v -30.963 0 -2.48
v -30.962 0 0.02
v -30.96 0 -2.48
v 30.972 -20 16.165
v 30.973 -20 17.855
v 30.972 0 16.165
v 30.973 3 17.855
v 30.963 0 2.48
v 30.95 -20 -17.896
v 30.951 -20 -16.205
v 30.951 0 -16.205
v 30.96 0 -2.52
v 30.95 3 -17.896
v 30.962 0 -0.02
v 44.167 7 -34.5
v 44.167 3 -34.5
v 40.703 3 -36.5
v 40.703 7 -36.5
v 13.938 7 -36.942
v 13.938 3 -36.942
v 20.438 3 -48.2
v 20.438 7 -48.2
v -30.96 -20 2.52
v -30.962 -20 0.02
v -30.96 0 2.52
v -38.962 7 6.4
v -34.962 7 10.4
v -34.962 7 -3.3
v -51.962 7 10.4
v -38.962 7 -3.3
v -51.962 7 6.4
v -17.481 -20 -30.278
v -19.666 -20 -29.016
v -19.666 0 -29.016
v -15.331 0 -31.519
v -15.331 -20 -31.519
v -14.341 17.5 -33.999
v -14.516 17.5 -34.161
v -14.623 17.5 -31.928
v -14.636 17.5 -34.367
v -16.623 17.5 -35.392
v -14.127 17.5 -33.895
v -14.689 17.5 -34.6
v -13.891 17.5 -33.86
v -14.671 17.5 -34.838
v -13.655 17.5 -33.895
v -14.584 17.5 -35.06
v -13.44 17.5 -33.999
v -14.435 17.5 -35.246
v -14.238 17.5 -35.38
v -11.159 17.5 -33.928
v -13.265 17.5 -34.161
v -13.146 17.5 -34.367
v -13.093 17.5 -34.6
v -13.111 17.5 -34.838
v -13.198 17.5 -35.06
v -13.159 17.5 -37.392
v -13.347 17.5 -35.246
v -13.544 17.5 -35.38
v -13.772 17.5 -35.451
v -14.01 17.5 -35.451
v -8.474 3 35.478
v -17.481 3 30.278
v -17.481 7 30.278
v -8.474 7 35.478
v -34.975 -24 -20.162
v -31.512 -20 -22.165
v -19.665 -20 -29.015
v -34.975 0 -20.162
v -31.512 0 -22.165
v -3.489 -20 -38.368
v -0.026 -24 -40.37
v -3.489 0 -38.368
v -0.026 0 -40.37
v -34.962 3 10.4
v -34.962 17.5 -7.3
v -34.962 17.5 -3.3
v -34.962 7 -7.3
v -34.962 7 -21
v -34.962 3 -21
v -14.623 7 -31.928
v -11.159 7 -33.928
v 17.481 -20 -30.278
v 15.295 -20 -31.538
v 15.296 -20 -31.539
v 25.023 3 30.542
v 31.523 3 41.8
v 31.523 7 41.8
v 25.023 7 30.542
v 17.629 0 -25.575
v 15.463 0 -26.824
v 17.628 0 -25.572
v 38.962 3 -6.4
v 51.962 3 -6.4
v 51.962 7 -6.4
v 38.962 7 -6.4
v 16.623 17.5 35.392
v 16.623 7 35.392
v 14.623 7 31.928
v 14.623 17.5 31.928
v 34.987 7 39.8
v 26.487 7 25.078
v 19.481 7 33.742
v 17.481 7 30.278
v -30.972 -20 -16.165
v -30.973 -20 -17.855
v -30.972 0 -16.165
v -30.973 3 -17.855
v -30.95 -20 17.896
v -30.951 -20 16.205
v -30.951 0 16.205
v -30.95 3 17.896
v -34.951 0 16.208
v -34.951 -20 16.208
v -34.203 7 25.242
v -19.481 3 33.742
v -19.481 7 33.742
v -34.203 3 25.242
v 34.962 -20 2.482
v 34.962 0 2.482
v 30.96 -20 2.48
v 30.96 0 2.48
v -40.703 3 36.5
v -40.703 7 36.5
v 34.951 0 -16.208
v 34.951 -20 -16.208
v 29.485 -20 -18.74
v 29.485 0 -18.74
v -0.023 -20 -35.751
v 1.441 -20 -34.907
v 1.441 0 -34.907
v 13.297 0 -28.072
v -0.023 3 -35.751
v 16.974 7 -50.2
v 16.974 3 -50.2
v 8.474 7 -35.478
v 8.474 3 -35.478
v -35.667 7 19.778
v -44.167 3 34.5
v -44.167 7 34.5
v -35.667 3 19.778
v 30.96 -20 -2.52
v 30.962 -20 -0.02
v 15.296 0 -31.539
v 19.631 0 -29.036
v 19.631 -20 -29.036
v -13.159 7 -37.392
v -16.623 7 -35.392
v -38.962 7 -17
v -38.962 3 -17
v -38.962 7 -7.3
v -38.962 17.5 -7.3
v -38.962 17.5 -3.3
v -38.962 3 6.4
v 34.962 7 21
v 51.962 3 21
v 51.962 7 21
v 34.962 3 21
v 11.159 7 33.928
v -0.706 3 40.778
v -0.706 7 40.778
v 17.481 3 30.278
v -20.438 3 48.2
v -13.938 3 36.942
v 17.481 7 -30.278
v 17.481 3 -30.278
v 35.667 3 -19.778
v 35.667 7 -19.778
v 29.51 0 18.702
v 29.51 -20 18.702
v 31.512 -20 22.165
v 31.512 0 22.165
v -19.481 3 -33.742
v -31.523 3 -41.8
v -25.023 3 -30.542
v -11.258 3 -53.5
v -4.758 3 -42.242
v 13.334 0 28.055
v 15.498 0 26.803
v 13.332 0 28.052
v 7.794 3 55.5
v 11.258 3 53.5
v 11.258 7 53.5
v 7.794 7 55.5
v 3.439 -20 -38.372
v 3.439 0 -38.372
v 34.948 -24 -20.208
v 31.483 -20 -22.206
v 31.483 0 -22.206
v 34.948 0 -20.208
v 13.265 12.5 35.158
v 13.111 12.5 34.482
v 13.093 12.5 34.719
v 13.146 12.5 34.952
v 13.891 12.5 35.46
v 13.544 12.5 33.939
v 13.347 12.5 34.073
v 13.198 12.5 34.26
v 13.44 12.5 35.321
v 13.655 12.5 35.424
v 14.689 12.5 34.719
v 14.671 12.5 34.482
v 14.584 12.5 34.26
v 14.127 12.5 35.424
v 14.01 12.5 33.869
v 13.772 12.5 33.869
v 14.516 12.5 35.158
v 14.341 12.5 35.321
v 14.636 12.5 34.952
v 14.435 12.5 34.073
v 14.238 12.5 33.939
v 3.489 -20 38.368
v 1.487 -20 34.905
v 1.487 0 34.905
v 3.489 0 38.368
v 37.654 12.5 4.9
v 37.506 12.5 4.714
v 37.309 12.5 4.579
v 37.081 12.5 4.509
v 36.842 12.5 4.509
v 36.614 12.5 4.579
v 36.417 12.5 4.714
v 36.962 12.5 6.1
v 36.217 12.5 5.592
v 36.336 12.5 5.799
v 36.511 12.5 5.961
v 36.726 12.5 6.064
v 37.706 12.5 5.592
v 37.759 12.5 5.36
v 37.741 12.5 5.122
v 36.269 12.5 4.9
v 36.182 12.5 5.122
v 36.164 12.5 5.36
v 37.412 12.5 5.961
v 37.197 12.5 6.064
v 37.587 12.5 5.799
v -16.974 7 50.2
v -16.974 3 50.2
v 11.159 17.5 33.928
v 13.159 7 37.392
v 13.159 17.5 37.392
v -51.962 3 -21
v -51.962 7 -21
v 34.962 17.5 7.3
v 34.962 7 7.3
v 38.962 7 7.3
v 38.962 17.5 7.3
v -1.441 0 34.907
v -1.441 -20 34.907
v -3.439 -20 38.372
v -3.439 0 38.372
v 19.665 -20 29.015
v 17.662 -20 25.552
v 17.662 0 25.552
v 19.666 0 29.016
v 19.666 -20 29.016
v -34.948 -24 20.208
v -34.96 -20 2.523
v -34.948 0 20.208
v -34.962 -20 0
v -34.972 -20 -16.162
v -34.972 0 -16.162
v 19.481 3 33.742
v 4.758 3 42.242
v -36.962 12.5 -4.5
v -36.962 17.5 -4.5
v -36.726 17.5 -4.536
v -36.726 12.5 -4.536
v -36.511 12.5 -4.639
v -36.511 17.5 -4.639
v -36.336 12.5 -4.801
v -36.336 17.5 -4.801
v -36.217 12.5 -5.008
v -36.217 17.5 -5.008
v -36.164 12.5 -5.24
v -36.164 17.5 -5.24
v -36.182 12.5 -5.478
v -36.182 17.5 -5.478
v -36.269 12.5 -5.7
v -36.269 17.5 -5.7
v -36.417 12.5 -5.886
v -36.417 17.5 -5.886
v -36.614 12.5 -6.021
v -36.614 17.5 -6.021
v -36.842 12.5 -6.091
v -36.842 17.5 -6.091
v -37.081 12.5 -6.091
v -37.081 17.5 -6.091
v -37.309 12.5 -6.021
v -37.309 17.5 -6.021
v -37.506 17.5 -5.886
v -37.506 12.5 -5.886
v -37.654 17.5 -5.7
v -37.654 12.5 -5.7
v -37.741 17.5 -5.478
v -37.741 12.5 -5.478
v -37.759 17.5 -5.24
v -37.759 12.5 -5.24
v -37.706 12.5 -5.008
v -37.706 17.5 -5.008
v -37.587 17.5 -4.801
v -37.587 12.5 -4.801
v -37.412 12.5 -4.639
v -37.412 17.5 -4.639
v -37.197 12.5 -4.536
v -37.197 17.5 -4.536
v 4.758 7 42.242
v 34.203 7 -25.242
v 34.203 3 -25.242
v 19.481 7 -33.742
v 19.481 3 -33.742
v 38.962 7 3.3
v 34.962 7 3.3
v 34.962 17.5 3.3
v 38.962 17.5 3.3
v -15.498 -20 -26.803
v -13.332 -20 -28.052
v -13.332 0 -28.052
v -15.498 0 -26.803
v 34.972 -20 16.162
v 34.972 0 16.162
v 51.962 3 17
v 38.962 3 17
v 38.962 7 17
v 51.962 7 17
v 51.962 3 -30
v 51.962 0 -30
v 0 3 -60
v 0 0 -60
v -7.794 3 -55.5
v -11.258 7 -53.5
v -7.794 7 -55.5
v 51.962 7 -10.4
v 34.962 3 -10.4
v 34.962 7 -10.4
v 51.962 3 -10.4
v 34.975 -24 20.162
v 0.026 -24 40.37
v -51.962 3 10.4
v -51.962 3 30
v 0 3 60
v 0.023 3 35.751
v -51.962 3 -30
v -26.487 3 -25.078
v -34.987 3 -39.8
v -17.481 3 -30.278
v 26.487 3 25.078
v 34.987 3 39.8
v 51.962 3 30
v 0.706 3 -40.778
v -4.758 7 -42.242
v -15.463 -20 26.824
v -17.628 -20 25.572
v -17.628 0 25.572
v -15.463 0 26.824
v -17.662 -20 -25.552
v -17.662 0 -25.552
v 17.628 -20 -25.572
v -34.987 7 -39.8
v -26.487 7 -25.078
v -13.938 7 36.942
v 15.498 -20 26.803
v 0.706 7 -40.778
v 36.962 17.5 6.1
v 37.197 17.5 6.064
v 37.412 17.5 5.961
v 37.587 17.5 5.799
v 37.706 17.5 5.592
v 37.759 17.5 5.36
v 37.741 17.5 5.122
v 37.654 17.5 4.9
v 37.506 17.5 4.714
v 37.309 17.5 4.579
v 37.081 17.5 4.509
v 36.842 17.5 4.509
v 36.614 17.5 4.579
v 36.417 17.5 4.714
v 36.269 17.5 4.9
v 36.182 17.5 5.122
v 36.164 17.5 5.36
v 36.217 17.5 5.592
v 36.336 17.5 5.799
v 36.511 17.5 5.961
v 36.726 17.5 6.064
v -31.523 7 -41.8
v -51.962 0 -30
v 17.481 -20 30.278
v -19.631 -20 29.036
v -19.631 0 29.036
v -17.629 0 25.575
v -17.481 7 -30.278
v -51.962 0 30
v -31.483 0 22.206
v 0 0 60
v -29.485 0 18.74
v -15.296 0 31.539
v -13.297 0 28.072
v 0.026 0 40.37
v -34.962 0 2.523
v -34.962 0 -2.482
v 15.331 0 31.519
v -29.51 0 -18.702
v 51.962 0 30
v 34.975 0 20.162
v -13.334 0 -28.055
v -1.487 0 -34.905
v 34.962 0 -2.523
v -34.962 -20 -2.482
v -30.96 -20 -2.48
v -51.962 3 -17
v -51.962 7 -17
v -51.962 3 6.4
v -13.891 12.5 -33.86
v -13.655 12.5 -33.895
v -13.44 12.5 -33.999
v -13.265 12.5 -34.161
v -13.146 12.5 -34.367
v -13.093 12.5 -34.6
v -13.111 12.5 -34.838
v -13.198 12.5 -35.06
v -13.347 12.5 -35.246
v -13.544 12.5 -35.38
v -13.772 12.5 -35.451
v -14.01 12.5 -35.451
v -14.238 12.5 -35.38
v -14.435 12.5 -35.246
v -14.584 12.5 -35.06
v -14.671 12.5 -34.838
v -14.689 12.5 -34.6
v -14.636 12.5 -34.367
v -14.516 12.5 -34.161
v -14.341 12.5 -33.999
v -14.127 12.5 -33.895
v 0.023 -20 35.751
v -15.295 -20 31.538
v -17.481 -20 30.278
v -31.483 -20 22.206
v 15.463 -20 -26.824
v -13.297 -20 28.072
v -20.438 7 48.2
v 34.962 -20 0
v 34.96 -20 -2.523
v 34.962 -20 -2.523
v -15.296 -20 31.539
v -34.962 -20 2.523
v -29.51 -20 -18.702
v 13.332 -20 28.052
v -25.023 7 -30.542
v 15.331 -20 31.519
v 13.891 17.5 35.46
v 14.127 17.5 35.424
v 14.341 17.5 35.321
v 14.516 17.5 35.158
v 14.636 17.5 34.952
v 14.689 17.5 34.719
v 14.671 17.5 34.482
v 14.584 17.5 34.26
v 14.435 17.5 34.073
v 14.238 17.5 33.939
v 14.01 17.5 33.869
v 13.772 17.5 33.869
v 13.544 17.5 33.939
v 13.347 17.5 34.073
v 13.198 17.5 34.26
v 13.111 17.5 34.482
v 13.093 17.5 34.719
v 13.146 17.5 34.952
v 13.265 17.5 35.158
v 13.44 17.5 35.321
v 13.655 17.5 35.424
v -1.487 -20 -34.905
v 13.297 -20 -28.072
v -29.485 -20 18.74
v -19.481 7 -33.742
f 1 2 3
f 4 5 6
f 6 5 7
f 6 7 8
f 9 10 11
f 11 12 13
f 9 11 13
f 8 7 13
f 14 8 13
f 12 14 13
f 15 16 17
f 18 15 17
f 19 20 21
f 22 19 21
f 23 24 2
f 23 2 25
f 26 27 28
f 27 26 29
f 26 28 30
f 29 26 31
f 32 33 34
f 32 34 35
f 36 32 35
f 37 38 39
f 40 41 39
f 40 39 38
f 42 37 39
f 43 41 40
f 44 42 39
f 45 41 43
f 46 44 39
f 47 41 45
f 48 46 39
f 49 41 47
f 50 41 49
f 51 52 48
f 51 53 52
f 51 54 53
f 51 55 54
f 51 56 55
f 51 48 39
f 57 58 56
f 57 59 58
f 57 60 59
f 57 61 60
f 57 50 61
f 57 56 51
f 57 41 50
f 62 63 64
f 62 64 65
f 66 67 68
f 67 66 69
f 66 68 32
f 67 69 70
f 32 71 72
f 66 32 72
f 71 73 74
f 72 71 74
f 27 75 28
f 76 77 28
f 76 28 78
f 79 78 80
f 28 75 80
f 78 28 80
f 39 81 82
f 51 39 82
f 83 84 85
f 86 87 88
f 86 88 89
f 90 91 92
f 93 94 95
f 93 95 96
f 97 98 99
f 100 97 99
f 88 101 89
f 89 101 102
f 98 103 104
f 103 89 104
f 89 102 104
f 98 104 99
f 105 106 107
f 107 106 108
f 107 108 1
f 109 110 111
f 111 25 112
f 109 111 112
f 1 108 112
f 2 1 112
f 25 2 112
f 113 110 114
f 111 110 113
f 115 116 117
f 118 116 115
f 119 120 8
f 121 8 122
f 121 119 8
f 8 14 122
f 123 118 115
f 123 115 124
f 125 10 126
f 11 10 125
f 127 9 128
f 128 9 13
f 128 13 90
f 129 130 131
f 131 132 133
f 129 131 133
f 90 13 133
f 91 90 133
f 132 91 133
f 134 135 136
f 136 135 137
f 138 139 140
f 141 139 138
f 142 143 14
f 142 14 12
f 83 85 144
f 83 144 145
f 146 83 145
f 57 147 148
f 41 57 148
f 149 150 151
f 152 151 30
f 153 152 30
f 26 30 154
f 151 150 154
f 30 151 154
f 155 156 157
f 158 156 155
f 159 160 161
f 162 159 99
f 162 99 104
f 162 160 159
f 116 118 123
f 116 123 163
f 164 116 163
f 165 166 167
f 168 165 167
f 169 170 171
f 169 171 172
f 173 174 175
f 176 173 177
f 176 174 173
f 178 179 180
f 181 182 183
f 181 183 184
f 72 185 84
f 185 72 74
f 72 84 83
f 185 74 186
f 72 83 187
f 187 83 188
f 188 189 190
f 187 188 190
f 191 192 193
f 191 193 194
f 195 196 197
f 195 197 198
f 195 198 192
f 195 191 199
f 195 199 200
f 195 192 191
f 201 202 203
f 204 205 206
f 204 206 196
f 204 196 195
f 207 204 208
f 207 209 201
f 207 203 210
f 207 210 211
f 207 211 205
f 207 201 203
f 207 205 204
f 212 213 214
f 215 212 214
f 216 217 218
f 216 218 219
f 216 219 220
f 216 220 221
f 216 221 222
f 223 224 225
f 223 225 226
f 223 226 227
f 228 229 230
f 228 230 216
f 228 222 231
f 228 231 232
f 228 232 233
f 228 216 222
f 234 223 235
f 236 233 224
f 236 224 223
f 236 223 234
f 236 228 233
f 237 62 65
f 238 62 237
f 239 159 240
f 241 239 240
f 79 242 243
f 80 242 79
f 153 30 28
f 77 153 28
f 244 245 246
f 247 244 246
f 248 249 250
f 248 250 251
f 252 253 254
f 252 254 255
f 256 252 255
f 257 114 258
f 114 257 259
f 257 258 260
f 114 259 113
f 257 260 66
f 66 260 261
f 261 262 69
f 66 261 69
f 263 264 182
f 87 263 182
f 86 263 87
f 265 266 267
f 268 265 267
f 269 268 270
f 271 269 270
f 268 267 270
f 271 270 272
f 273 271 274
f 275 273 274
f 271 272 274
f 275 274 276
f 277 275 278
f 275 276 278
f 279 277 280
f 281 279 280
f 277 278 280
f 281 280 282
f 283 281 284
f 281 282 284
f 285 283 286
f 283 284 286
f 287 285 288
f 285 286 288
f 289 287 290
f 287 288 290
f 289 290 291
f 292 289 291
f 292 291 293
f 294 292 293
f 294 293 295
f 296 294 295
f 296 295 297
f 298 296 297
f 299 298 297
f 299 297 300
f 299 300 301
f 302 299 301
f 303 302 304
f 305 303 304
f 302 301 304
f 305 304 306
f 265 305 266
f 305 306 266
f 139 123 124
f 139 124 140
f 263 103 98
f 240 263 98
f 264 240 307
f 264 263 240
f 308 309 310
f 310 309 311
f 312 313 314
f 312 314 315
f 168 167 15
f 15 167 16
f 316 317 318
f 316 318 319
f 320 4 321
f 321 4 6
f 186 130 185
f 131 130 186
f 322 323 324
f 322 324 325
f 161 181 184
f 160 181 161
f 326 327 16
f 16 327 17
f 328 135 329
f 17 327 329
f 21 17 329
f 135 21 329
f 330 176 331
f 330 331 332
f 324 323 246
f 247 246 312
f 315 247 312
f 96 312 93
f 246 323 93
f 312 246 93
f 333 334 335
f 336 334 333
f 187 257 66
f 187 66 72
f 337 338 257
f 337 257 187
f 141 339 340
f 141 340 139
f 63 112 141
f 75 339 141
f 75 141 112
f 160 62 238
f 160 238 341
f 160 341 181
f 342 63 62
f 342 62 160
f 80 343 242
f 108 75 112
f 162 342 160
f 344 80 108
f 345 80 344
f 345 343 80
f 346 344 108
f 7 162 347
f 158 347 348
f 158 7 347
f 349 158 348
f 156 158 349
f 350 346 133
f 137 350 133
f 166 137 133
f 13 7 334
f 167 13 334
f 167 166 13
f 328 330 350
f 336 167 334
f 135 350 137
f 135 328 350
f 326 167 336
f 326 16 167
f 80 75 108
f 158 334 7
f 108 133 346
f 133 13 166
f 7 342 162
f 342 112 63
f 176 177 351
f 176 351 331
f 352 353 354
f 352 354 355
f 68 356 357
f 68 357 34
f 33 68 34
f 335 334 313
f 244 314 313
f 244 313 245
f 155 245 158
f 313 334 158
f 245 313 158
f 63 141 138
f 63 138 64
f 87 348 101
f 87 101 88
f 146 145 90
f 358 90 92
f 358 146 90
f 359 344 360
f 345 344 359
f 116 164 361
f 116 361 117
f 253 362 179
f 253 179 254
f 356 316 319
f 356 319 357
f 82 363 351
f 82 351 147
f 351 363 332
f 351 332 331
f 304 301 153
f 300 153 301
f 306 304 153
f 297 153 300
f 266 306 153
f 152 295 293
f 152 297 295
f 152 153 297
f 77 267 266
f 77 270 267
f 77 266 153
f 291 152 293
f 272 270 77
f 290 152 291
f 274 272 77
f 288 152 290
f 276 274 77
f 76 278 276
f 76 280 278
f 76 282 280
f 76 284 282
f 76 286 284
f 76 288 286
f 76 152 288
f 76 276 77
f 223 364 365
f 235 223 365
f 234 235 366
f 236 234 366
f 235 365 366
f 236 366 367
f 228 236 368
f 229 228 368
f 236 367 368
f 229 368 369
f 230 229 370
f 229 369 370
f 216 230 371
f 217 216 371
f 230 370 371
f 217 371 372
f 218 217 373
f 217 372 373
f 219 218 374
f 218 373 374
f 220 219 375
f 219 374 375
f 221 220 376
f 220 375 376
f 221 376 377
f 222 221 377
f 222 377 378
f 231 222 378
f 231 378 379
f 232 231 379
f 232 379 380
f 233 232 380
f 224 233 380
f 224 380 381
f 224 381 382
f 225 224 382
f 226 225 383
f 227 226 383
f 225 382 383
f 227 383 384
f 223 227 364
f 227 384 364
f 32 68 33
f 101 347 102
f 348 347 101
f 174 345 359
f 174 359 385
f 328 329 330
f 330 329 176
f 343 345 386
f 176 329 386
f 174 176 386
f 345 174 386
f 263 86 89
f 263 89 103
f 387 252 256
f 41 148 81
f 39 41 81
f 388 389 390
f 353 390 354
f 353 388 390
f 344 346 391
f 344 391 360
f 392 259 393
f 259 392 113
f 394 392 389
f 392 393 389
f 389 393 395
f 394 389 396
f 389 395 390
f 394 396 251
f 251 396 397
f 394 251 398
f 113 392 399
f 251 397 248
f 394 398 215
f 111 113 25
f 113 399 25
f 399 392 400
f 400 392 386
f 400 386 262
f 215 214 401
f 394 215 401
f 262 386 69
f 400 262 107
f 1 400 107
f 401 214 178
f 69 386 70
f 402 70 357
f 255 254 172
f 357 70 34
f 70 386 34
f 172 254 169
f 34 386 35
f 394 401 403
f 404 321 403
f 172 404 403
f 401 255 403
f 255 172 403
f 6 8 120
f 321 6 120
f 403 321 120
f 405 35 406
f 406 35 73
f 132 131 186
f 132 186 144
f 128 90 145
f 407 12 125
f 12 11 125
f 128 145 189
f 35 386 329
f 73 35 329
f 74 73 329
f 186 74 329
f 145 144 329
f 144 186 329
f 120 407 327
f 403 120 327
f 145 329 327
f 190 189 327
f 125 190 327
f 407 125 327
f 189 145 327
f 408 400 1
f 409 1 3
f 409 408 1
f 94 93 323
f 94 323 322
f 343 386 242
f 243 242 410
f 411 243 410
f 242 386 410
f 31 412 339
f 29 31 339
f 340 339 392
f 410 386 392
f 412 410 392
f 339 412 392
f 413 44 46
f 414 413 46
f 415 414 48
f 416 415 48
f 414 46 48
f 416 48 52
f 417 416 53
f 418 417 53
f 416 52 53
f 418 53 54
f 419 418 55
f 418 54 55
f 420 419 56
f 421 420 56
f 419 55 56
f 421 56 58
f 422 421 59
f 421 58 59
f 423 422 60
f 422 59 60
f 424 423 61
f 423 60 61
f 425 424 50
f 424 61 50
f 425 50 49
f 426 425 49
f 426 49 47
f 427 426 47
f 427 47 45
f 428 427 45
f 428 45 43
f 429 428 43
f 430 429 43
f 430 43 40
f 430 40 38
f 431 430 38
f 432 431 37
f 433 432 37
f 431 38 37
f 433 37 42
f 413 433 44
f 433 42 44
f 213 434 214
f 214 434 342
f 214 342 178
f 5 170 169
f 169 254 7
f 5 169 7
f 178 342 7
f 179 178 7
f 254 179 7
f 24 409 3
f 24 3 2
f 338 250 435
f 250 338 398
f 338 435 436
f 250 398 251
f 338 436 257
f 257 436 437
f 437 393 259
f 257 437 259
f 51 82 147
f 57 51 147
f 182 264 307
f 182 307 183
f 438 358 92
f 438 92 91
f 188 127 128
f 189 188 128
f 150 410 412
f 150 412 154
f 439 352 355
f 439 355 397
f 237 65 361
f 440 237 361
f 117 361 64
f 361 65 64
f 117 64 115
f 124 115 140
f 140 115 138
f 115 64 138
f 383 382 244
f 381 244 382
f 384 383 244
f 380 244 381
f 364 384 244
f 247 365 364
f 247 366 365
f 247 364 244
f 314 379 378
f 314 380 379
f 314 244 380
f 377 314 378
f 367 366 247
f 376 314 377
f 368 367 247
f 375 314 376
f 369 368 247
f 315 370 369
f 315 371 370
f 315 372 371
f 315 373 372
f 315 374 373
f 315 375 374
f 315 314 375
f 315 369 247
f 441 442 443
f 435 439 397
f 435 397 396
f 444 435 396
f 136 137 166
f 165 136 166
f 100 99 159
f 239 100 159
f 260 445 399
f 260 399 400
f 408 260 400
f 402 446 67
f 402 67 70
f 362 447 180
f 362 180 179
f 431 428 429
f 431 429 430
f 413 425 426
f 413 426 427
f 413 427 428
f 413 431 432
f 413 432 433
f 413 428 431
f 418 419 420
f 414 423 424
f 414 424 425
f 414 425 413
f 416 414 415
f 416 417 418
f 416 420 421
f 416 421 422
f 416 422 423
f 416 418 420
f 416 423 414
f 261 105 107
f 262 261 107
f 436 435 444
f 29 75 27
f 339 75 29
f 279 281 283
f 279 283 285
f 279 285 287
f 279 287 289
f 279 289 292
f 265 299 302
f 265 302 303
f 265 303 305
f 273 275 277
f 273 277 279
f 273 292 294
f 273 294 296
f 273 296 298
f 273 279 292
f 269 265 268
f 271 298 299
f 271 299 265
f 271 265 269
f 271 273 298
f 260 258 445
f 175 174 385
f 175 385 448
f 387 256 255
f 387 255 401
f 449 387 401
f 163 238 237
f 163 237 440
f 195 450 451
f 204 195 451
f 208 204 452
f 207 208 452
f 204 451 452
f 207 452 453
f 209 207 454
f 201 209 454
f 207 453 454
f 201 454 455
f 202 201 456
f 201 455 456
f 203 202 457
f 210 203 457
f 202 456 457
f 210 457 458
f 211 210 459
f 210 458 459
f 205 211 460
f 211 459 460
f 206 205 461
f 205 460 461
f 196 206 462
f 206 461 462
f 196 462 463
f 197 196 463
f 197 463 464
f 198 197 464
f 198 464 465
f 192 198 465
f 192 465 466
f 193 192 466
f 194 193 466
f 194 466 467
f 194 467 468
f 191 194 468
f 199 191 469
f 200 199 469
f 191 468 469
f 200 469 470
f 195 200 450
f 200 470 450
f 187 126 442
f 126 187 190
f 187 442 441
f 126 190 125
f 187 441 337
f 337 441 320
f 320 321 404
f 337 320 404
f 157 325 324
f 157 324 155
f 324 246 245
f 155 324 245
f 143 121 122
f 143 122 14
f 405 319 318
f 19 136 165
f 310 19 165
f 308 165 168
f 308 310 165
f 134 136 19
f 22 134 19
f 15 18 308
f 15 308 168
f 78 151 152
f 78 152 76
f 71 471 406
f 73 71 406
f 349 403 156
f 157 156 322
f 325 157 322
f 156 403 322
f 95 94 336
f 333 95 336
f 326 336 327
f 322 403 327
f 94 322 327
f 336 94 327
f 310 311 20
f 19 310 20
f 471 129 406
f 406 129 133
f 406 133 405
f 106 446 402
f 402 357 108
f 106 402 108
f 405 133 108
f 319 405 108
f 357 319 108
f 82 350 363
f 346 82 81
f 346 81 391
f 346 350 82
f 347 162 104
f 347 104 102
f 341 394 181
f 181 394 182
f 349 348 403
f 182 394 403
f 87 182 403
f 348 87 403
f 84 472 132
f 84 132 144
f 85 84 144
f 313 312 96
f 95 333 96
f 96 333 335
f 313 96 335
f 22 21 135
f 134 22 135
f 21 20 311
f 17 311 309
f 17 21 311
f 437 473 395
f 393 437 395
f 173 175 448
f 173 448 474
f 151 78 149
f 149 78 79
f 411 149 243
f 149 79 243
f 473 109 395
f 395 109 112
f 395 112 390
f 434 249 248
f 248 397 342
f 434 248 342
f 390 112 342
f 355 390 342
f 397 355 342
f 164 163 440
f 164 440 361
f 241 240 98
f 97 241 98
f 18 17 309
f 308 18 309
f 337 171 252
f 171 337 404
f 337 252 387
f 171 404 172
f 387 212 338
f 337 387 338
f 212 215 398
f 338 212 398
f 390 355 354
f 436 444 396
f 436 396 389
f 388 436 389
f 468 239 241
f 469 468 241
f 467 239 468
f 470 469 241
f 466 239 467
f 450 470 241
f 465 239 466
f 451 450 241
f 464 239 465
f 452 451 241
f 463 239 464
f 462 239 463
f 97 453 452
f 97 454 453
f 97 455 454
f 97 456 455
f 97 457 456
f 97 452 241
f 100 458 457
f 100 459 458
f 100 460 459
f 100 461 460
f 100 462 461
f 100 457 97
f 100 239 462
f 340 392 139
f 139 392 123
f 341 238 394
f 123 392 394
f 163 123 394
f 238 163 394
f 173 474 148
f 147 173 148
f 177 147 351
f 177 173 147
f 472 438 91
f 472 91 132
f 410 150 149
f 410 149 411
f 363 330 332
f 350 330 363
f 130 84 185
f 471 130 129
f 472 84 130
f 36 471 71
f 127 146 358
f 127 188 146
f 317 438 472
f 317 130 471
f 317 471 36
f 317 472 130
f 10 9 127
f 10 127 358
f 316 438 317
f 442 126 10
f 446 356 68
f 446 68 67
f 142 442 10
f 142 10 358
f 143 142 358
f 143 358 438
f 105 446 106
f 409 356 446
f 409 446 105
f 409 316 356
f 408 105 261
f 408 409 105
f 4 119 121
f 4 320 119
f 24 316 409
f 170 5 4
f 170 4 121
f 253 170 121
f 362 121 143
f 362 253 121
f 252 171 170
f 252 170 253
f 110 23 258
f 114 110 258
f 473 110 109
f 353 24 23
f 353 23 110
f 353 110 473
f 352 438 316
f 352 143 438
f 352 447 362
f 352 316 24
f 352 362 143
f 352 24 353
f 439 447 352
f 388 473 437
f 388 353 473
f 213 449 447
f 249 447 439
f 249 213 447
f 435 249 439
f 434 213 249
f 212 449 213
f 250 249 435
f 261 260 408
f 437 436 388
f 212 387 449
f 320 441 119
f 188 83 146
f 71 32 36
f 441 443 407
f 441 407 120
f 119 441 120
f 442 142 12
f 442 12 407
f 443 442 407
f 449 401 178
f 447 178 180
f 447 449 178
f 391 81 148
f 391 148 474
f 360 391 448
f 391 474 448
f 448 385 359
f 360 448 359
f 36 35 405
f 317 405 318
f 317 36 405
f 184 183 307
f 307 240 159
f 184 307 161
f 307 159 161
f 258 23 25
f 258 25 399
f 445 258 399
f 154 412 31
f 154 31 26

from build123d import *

# Parameters (mm, degrees)
BOSS_EXTRUDE1_DEPTH  = 3
BOSS_EXTRUDE2_DEPTH  = 4
SKETCH5_W            = 4
SKETCH5_H            = 4
BOSS_EXTRUDE3_DEPTH  = 10.5
SKETCH7_R            = 2.4
BOSS_EXTRUDE4_DEPTH  = 3
SKETCH9_R            = 0.8
CUT_EXTRUDE6_DEPTH   = 5
BOSS_EXTRUDE10_DEPTH = 24
CUT_EXTRUDE7_DEPTH   = 23
CUT_EXTRUDE10_START  = -24
SKETCH24_W           = 32.370082298
SKETCH24_H           = 20
CUT_EXTRUDE10_DEPTH  = 133.325180249
CIRPATTERN1_COUNT    = 6
BOSS_EXTRUDE11_DEPTH = 20
CIRPATTERN2_COUNT    = 6


with BuildPart() as part:
    # Sketch1 → Boss-Extrude1 (new body)
    with BuildSketch(Plane(origin=(0, 0, 0), x_dir=(1, 0, 0), z_dir=(0, 1, 0))):
        Polygon((0, 60), (-51.961524227, 30), (-51.961524227, -30), (0, -60), (51.961524227, -30), (51.961524227, 30), align=None)
    extrude(amount=BOSS_EXTRUDE1_DEPTH)

    # Sketch2 → Boss-Extrude2 (add)
    with BuildSketch(Plane(origin=(0, 3, 0), x_dir=(1, 0, 0), z_dir=(0, 1, 0))):
        Polygon((35.667295593, 19.777568136), (44.167295593, 34.5), (40.703193978, 36.5), (34.203193978, 25.241669751), (19.480762114, 33.741669751), (13.938199529, 36.941669751), (20.438199529, 48.2), (16.974097914, 50.2), (8.474097914, 35.477568136), (17.480762114, 30.277568136), align=None)
        Polygon((51.961524227, -17), (51.961524227, -21), (34.961524227, -21), (34.961524227, 0), (34.961524227, 10.4), (51.961524227, 10.4), (51.961524227, 6.4), (38.961524227, 6.4), (38.961524227, 0), (38.961524227, -17), align=None)
        Polygon((11.258330249, -53.5), (7.794228634, -55.5), (-0.705771366, -40.777568136), (17.480762114, -30.277568136), (26.487426313, -25.077568136), (34.987426313, -39.8), (31.523324698, -41.8), (25.023324698, -30.541669751), (19.480762114, -33.741669751), (4.758330249, -42.241669751), align=None)
        Polygon((-40.703193978, -36.5), (-44.167295593, -34.5), (-35.667295593, -19.777568136), (-17.480762114, -30.277568136), (-8.474097914, -35.477568136), (-16.974097914, -50.2), (-20.438199529, -48.2), (-13.938199529, -36.941669751), (-19.480762114, -33.741669751), (-34.203193978, -25.241669751), align=None)
        Polygon((-51.961524227, 17), (-51.961524227, 21), (-34.961524227, 21), (-34.961524227, 0), (-34.961524227, -10.4), (-51.961524227, -10.4), (-51.961524227, -6.4), (-38.961524227, -6.4), (-38.961524227, 0), (-38.961524227, 17), align=None)
        Polygon((-11.258330249, 53.5), (-7.794228634, 55.5), (0.705771366, 40.777568136), (-17.480762114, 30.277568136), (-26.487426313, 25.077568136), (-34.987426313, 39.8), (-31.523324698, 41.8), (-25.023324698, 30.541669751), (-19.480762114, 33.741669751), (-4.758330249, 42.241669751), align=None)
    extrude(amount=BOSS_EXTRUDE2_DEPTH)

    # Sketch5 → Boss-Extrude3 (add)
    with BuildSketch(Plane(origin=(0, 7, 0), x_dir=(1, 0, 0), z_dir=(0, 1, 0))):
        with Locations((36.961524227, -5.3)):
            Rectangle(SKETCH5_W, SKETCH5_H)
        Polygon((14.622878281, -31.927568136), (11.158776666, -33.927568136), (13.158776666, -37.391669751), (16.622878281, -35.391669751), align=None)
        with Locations((-36.961524227, 5.3)):
            Rectangle(SKETCH5_W, SKETCH5_H)
        Polygon((-14.622878281, 31.927568136), (-11.158776666, 33.927568136), (-13.158776666, 37.391669751), (-16.622878281, 35.391669751), align=None)
    extrude(amount=BOSS_EXTRUDE3_DEPTH)

    # Sketch7 → Boss-Extrude4 (add)
    with BuildSketch(Plane.XZ):
        with Locations((22.730762114, 39.370834875)):
            Circle(SKETCH7_R)
        with Locations((45.461524227, 0)):
            Circle(SKETCH7_R)
        with Locations((22.730762114, -39.370834875)):
            Circle(SKETCH7_R)
        with Locations((-22.730762114, -39.370834875)):
            Circle(SKETCH7_R)
        with Locations((-45.461524227, 0)):
            Circle(SKETCH7_R)
        with Locations((-22.730762114, 39.370834875)):
            Circle(SKETCH7_R)
    extrude(amount=BOSS_EXTRUDE4_DEPTH)

    # Sketch9 → Cut-Extrude6 (cut)
    with BuildSketch(Plane(origin=(0, 17.5, 0), x_dir=(1, 0, 0), z_dir=(0, 1, 0))):
        with Locations((-36.961524227, 5.3)):
            Circle(SKETCH9_R)
        with Locations((-13.890827473, 34.659618943)):
            Circle(SKETCH9_R)
        with Locations((23.070696754, 29.359618943)):
            Circle(SKETCH9_R)
        with Locations((36.961524227, -5.3)):
            Circle(SKETCH9_R)
        with Locations((13.890827473, -34.659618943)):
            Circle(SKETCH9_R)
        with Locations((-23.070696754, -29.359618943)):
            Circle(SKETCH9_R)
    extrude(amount=-CUT_EXTRUDE6_DEPTH, mode=Mode.SUBTRACT)

    # Sketch22 → Boss-Extrude10 (add)
    with BuildSketch(Plane.XZ):
        Polygon((-34.948372872, 20.207790041), (-34.974645966, -20.162283708), (-0.026273093, -40.370073749), (34.948372872, -20.207790041), (34.974645966, 20.162283708), (0.026273093, 40.370073749), align=None)
    extrude(amount=BOSS_EXTRUDE10_DEPTH)

    # Sketch23 → Cut-Extrude7 (cut)
    with BuildSketch(Plane(origin=(0, 3, 0), x_dir=(1, 0, 0), z_dir=(0, 1, 0))):
        Polygon((-0.023267149, 35.751272573), (-30.973143841, 17.855486345), (-30.949876692, -17.895786229), (0.023267149, -35.751272573), (30.973143841, -17.855486345), (30.949876692, 17.895786229), align=None)
    extrude(amount=-CUT_EXTRUDE7_DEPTH, mode=Mode.SUBTRACT)

    # Sketch24 → Cut-Extrude10 (cut)
    with BuildSketch(Plane(origin=(34.961509419, 0, -0.022753166), x_dir=(-0.0006508060386860347, 0, -0.9999997882257277), z_dir=(0.9999997882257275, 0, -0.0006508060386860346)).offset(CUT_EXTRUDE10_START)):
        with Locations((0, -10)):
            Rectangle(SKETCH24_W, SKETCH24_H)
    cut_extrude10 = extrude(amount=CUT_EXTRUDE10_DEPTH, mode=Mode.SUBTRACT)

    # CirPattern1: Cut-Extrude10 ×6 about axis
    cirpattern1_axis = Axis((0, 0, 0), (0, 1, 0))
    for i in range(1, CIRPATTERN1_COUNT):
        add(cut_extrude10.rotate(cirpattern1_axis, i * 360 / CIRPATTERN1_COUNT), mode=Mode.SUBTRACT)

    # Sketch25 → Boss-Extrude11 (add)
    with BuildSketch(Plane(origin=(0, -20, 0), x_dir=(1, 0, 0), z_dir=(0, 1, 0))):
        Polygon((15.498205495, -26.803379459), (17.662455038, -25.551970687), (19.66553091, -29.016191283), (15.330894041, -31.518795046), (13.332328936, -28.051970158), align=None)
    boss_extrude11 = extrude(amount=BOSS_EXTRUDE11_DEPTH)

    # CirPattern2: Boss-Extrude11 ×6 about axis
    cirpattern2_axis = Axis((0, 0, 0), (0, 1, 0))
    for i in range(1, CIRPATTERN2_COUNT):
        add(boss_extrude11.rotate(cirpattern2_axis, i * 360 / CIRPATTERN2_COUNT))


solid = part.part
